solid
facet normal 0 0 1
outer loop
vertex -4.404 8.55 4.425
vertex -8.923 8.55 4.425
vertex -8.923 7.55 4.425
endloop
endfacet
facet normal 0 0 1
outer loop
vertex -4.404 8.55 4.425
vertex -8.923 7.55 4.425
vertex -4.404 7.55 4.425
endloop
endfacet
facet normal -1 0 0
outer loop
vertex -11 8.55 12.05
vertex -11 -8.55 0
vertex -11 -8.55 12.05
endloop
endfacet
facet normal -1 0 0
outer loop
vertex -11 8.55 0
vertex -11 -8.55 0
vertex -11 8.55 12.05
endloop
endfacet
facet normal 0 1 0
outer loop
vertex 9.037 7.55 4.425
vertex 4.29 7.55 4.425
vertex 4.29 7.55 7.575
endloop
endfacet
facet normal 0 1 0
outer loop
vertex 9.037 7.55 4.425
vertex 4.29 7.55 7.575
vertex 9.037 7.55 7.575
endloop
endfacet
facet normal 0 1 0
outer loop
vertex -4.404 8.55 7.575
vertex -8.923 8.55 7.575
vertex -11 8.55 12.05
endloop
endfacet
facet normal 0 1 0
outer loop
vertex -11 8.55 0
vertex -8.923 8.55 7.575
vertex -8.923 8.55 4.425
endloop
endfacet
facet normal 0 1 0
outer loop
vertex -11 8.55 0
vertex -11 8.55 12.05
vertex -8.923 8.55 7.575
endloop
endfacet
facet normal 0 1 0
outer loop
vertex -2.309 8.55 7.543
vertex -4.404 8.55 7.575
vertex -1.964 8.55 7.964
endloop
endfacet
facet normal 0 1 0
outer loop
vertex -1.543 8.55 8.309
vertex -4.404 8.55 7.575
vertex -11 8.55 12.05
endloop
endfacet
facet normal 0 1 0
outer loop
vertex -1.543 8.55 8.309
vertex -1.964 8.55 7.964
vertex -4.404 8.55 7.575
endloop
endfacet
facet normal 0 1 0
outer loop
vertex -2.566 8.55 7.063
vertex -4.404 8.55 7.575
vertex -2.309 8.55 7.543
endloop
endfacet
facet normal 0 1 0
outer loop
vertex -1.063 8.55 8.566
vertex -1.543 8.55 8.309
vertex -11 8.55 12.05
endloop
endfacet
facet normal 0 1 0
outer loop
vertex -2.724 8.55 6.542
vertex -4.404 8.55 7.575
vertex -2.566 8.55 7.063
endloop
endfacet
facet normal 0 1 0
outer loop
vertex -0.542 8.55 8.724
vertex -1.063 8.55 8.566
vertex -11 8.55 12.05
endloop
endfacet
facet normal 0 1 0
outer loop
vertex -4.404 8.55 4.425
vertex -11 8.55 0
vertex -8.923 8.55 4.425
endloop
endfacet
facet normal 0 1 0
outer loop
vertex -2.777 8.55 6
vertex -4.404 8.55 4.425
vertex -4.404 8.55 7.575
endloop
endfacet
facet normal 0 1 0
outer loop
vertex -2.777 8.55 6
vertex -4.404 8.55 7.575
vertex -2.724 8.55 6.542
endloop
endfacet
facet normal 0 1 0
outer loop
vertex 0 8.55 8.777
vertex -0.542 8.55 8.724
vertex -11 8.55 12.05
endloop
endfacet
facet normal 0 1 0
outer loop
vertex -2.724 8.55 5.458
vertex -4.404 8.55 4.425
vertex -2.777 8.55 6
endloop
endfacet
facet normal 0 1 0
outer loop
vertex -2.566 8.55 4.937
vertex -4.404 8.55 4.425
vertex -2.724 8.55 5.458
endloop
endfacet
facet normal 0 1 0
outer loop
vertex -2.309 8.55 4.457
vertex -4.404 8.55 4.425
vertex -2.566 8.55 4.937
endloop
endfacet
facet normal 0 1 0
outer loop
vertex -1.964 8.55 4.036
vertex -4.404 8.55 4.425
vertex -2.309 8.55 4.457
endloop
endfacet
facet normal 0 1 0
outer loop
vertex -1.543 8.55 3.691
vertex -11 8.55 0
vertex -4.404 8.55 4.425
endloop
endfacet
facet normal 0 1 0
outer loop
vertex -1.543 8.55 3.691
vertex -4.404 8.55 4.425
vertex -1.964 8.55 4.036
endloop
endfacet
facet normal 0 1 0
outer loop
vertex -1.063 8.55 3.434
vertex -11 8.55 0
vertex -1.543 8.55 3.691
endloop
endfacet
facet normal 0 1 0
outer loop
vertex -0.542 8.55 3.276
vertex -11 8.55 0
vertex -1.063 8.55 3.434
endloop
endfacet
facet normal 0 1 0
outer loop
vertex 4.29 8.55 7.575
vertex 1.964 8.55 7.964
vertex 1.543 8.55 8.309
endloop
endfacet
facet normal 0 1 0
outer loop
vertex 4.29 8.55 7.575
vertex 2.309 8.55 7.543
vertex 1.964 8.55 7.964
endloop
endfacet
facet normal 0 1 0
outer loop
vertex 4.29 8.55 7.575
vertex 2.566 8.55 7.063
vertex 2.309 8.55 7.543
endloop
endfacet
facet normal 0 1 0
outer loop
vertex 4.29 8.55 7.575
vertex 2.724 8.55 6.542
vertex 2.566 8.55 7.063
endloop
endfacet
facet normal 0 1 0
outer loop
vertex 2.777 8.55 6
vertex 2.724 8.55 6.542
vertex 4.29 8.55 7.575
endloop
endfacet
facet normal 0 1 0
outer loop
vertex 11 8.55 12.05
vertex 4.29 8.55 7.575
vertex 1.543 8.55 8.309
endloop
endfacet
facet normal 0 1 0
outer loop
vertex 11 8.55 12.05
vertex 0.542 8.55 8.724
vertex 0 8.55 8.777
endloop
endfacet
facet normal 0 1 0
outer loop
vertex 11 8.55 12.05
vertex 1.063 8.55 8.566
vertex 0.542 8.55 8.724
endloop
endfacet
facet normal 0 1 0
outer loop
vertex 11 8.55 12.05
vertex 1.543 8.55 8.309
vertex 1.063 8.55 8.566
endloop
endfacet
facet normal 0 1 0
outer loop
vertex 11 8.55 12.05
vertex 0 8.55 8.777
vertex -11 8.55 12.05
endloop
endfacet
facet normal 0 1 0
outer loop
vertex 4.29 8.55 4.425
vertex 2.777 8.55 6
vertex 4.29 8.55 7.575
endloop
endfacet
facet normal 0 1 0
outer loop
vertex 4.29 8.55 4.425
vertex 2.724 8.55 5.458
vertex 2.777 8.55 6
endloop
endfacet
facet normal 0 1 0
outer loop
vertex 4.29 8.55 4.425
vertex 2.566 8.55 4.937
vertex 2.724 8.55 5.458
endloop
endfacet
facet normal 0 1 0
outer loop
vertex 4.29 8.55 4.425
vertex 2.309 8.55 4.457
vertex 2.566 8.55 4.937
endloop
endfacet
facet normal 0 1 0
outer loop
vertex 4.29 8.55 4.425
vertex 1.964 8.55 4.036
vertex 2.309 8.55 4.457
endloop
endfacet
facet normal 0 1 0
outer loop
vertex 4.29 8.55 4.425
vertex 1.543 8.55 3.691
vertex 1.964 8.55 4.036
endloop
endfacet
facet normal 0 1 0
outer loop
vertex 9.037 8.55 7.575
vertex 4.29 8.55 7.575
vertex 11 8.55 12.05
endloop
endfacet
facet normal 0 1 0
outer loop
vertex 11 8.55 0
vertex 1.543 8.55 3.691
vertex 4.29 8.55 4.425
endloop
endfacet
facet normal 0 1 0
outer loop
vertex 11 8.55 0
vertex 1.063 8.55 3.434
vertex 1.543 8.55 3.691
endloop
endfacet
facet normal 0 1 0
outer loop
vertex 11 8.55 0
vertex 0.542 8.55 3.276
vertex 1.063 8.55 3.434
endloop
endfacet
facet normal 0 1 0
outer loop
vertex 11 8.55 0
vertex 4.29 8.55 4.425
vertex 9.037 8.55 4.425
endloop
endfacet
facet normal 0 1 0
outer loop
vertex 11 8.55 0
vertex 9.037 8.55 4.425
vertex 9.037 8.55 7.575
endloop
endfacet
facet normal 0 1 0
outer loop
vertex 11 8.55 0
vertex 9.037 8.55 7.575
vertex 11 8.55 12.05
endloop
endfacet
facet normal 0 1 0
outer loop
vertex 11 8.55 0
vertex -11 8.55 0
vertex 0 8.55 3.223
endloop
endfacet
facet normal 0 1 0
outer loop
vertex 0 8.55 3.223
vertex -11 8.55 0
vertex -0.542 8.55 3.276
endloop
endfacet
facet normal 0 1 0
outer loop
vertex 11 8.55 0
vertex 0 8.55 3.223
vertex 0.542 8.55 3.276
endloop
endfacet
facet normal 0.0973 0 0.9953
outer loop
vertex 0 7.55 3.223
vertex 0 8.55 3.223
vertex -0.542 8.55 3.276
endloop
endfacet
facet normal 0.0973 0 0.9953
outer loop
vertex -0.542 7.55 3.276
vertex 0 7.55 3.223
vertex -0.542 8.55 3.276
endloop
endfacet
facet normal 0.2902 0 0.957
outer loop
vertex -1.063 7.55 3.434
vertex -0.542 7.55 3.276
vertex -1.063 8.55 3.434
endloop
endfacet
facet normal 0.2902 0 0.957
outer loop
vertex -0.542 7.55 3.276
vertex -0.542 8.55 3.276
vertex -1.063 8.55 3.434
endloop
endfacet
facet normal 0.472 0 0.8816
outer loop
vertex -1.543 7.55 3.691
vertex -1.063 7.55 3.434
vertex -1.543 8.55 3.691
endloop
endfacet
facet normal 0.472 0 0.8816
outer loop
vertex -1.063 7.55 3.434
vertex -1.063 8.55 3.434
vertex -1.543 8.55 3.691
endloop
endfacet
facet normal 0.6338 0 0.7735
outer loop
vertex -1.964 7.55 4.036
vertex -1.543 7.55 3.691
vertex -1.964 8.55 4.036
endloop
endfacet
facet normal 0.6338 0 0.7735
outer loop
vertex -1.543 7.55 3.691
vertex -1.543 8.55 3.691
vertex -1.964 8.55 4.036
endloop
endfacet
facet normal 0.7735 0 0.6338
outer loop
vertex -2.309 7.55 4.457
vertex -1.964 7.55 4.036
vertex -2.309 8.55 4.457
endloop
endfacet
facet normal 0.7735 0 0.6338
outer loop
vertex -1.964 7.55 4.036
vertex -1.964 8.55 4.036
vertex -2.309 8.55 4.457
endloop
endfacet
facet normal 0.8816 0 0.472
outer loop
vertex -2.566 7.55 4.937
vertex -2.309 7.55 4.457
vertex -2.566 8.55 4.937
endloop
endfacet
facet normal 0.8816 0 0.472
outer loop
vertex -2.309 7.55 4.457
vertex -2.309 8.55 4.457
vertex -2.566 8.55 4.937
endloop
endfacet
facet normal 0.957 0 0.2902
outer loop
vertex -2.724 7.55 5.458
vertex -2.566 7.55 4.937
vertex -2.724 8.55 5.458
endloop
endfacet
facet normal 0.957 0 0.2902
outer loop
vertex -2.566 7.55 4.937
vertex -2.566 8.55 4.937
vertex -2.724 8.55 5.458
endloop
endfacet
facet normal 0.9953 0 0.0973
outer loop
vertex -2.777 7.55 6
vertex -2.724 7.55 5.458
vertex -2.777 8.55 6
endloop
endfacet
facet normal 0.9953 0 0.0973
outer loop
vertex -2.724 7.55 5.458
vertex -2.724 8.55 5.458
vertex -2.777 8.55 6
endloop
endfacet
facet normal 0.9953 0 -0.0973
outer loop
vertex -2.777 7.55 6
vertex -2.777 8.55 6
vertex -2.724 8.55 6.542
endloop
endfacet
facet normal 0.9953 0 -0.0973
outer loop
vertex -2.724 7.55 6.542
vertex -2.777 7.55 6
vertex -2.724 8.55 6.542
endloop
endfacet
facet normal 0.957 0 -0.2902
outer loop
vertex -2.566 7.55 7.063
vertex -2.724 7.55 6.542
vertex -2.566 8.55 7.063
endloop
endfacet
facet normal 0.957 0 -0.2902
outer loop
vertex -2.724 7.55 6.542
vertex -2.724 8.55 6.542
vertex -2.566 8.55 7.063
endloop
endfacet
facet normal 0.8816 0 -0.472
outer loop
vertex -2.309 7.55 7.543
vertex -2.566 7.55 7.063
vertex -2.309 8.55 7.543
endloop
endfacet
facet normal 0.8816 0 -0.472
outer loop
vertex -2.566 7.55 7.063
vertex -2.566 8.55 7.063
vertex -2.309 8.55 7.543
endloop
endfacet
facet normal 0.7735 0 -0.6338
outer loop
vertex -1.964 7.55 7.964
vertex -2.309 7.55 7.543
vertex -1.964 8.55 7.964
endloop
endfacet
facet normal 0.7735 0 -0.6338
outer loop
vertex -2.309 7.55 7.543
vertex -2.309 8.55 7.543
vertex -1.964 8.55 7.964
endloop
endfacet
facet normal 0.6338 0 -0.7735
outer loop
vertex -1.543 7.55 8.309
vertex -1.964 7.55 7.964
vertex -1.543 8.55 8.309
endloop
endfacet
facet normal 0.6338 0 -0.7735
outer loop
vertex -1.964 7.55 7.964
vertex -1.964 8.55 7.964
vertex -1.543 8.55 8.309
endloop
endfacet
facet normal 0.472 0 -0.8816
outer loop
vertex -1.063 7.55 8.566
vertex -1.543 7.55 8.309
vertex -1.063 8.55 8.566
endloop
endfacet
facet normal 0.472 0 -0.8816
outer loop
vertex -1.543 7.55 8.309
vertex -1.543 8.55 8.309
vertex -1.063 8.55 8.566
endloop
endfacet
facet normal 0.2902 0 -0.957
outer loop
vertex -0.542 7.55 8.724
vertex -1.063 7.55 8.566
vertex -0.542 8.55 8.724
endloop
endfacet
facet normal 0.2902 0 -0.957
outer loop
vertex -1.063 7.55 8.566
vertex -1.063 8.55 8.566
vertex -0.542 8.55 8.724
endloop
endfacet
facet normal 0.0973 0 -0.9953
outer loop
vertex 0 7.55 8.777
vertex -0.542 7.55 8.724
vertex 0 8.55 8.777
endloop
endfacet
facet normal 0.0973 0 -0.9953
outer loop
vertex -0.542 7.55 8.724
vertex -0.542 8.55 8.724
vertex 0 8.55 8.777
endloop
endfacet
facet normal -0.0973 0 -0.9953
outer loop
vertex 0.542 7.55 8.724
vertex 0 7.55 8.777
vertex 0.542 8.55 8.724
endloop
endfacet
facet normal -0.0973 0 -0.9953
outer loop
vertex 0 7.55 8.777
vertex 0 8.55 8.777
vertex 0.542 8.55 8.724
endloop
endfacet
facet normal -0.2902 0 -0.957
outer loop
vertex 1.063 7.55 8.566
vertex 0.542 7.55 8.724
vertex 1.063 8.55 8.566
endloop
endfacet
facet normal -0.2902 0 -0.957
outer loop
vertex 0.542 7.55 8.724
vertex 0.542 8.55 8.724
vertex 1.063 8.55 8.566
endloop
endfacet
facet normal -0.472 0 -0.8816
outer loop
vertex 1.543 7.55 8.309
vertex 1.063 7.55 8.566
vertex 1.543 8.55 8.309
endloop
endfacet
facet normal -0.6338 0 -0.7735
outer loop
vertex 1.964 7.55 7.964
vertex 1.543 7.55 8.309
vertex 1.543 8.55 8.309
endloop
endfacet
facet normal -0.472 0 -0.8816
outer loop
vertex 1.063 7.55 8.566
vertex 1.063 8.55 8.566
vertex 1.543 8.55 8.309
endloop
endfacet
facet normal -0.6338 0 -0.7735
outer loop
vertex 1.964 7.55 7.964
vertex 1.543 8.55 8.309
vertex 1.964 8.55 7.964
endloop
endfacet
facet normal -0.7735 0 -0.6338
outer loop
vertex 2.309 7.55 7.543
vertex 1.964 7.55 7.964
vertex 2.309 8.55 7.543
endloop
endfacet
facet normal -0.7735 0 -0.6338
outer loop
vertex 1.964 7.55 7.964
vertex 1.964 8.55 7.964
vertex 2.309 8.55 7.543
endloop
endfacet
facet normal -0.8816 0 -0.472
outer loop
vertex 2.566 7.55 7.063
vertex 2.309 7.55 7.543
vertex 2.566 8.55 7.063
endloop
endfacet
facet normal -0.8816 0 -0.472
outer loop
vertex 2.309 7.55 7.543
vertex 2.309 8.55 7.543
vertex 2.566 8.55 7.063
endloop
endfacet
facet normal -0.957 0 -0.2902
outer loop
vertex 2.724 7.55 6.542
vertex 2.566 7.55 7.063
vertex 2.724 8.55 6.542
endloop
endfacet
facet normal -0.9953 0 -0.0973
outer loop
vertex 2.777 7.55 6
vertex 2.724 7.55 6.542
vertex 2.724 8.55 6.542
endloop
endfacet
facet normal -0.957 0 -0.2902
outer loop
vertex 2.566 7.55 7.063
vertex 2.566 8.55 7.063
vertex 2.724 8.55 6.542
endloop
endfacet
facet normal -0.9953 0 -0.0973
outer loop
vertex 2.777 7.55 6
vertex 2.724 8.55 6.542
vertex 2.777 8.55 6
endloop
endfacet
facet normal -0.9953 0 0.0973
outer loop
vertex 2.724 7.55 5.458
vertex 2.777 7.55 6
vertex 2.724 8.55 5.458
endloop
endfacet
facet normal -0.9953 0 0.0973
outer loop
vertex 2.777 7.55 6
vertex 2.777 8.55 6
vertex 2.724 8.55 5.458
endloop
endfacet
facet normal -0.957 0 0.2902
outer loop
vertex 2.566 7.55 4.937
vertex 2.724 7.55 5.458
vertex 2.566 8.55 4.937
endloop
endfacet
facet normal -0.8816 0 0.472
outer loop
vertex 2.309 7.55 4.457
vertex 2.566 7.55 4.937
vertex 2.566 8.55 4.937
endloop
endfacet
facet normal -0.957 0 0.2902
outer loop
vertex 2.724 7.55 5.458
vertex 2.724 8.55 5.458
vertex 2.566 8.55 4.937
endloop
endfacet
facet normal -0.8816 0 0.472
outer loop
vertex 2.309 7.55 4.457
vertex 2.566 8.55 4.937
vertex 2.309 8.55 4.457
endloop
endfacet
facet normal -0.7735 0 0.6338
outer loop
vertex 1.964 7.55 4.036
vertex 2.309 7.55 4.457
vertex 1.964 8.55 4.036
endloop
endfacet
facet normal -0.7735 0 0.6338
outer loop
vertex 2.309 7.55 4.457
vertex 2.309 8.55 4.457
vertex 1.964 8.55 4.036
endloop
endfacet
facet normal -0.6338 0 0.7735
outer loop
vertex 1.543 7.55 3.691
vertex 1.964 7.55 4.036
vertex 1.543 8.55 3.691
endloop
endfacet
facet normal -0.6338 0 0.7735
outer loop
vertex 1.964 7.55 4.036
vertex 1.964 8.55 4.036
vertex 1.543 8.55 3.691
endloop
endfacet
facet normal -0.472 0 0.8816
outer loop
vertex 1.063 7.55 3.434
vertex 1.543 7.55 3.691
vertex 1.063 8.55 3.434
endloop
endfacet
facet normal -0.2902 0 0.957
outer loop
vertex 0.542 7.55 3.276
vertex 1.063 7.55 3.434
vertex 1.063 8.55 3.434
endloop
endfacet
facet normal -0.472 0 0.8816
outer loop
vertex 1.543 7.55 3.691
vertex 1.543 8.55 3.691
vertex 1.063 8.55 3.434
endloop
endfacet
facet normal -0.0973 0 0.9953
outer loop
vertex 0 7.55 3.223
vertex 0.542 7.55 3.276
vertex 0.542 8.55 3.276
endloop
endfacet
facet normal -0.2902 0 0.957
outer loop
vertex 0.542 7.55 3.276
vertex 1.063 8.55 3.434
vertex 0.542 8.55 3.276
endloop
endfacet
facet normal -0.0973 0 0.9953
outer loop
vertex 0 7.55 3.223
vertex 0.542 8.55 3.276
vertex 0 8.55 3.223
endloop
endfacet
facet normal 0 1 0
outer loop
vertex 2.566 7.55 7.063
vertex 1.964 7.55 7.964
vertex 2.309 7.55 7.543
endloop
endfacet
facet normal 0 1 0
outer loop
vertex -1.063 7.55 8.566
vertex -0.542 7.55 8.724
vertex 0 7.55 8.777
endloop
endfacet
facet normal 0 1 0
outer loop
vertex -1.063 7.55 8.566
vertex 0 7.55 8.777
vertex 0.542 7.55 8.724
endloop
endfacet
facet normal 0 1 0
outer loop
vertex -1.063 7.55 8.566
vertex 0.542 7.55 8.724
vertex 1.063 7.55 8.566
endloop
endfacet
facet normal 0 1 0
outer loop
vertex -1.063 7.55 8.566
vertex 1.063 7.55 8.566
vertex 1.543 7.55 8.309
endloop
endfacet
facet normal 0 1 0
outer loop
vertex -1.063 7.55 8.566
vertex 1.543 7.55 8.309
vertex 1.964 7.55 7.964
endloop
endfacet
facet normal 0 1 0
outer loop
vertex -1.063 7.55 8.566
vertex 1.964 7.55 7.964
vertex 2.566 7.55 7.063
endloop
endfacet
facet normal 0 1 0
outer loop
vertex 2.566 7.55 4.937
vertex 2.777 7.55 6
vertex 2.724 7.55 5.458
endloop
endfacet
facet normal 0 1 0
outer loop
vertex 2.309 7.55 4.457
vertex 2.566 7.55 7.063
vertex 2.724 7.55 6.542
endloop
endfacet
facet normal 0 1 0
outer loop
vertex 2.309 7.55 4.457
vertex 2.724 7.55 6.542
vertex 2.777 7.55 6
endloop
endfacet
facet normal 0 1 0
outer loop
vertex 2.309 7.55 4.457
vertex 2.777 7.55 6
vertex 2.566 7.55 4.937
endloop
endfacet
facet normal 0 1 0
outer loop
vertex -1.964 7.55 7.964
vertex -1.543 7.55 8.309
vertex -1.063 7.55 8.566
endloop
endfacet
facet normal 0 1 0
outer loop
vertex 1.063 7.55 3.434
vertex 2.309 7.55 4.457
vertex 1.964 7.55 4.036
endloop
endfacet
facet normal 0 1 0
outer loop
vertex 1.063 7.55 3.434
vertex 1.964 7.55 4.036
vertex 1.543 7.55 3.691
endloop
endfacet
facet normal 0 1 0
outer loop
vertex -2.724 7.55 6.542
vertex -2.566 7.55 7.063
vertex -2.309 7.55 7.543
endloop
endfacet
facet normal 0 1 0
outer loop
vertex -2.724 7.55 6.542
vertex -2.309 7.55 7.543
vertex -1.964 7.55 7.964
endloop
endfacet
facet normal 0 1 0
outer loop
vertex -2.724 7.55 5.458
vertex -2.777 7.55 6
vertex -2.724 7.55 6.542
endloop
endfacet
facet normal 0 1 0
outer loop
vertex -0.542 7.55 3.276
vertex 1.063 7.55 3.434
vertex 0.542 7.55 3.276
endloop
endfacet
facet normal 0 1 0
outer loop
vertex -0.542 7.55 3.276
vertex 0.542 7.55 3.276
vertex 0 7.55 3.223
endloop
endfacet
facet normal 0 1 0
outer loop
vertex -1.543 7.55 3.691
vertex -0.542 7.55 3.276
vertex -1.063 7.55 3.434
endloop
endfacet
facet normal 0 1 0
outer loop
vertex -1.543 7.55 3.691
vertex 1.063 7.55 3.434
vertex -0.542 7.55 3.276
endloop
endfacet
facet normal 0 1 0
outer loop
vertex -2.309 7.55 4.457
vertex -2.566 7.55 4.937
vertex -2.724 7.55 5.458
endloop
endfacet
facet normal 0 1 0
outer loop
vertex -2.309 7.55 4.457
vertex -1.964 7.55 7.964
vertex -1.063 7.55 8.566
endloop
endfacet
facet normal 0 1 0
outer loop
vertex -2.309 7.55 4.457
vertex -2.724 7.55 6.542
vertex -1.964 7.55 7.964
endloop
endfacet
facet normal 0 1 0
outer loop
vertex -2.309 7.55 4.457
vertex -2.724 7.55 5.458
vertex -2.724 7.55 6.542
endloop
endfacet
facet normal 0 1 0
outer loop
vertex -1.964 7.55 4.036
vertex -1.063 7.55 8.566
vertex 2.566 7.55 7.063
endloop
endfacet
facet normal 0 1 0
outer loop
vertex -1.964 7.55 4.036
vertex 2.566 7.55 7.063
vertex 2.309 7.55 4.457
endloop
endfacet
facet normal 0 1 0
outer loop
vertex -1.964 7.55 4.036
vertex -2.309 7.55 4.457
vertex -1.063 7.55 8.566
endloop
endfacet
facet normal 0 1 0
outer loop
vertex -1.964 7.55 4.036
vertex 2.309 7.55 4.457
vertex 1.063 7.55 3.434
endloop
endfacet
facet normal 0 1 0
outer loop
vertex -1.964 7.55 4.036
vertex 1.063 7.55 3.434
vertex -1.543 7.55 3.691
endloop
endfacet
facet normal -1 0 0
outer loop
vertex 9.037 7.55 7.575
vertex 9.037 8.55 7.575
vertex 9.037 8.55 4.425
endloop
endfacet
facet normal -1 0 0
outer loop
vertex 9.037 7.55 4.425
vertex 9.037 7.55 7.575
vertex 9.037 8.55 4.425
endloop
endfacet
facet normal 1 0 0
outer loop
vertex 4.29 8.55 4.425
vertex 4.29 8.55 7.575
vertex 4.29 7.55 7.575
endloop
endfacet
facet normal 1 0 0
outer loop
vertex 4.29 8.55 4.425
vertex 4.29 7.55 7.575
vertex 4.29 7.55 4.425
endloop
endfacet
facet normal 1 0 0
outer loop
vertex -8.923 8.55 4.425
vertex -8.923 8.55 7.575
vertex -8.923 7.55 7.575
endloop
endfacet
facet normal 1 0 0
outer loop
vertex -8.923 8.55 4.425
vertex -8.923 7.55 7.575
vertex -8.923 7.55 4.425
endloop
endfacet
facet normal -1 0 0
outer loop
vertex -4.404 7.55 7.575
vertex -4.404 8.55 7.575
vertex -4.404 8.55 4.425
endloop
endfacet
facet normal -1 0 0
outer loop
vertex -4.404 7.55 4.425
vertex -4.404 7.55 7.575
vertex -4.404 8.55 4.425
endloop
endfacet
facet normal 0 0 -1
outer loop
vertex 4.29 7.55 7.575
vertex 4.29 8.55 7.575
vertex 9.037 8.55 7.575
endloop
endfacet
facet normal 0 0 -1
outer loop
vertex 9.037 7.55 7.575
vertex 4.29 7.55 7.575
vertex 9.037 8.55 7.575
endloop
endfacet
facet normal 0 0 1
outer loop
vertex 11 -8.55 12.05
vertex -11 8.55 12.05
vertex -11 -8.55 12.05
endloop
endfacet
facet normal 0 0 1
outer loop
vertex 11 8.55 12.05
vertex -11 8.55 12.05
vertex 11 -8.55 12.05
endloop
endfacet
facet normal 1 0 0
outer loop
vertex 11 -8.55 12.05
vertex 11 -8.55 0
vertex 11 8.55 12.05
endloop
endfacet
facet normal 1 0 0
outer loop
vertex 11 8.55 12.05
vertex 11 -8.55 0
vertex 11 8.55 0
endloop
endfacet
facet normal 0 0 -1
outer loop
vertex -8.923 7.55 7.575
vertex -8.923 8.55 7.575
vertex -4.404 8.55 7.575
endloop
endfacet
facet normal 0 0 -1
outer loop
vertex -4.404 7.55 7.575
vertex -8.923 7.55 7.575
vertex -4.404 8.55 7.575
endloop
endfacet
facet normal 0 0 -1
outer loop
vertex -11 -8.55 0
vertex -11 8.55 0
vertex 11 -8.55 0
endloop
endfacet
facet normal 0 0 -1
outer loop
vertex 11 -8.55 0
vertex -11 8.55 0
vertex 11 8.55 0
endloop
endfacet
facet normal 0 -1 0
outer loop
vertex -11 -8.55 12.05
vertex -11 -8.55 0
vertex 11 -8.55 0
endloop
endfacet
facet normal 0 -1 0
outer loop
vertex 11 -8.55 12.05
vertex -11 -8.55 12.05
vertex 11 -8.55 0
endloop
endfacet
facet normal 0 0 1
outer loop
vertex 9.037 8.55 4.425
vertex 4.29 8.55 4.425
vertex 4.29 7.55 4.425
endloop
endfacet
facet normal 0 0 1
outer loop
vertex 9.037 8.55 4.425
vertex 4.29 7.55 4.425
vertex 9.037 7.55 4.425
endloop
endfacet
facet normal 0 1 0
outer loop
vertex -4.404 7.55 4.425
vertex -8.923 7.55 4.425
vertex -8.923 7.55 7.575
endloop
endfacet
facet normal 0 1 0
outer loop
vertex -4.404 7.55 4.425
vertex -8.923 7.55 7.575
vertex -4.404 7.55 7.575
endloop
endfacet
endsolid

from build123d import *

# Parameters (mm, degrees)
SKETCH1_W           = 22
SKETCH1_H           = 17.1
BOSS_EXTRUDE1_DEPTH = 12.05
CUT_EXTRUDE1_START  = 8.55
SKETCH2_R           = 2.77735613
SKETCH2_W           = 4.746499011
SKETCH2_H           = 3.149119536
SKETCH2_W_2         = 4.518301943
CUT_EXTRUDE1_DEPTH  = 1


with BuildPart() as part:
    # Sketch1 → Boss-Extrude1 (new body)
    with BuildSketch(Plane.XY):
        Rectangle(SKETCH1_W, SKETCH1_H)
    extrude(amount=BOSS_EXTRUDE1_DEPTH)

    # Sketch2 → Cut-Extrude1 (cut)
    with BuildSketch(Plane(origin=(0, 0, 0), x_dir=(1, 0, 0), z_dir=(0, 1, 0)).offset(CUT_EXTRUDE1_START)):
        with Locations(Location((0, -6, 0), (0, 0, 90))):
            Circle(SKETCH2_R)
        with Locations((6.663354381, -6)):
            Rectangle(SKETCH2_W, SKETCH2_H)
        with Locations((-6.663354381, -6)):
            Rectangle(SKETCH2_W_2, SKETCH2_H)
    extrude(amount=-CUT_EXTRUDE1_DEPTH, mode=Mode.SUBTRACT)


solid = part.part
